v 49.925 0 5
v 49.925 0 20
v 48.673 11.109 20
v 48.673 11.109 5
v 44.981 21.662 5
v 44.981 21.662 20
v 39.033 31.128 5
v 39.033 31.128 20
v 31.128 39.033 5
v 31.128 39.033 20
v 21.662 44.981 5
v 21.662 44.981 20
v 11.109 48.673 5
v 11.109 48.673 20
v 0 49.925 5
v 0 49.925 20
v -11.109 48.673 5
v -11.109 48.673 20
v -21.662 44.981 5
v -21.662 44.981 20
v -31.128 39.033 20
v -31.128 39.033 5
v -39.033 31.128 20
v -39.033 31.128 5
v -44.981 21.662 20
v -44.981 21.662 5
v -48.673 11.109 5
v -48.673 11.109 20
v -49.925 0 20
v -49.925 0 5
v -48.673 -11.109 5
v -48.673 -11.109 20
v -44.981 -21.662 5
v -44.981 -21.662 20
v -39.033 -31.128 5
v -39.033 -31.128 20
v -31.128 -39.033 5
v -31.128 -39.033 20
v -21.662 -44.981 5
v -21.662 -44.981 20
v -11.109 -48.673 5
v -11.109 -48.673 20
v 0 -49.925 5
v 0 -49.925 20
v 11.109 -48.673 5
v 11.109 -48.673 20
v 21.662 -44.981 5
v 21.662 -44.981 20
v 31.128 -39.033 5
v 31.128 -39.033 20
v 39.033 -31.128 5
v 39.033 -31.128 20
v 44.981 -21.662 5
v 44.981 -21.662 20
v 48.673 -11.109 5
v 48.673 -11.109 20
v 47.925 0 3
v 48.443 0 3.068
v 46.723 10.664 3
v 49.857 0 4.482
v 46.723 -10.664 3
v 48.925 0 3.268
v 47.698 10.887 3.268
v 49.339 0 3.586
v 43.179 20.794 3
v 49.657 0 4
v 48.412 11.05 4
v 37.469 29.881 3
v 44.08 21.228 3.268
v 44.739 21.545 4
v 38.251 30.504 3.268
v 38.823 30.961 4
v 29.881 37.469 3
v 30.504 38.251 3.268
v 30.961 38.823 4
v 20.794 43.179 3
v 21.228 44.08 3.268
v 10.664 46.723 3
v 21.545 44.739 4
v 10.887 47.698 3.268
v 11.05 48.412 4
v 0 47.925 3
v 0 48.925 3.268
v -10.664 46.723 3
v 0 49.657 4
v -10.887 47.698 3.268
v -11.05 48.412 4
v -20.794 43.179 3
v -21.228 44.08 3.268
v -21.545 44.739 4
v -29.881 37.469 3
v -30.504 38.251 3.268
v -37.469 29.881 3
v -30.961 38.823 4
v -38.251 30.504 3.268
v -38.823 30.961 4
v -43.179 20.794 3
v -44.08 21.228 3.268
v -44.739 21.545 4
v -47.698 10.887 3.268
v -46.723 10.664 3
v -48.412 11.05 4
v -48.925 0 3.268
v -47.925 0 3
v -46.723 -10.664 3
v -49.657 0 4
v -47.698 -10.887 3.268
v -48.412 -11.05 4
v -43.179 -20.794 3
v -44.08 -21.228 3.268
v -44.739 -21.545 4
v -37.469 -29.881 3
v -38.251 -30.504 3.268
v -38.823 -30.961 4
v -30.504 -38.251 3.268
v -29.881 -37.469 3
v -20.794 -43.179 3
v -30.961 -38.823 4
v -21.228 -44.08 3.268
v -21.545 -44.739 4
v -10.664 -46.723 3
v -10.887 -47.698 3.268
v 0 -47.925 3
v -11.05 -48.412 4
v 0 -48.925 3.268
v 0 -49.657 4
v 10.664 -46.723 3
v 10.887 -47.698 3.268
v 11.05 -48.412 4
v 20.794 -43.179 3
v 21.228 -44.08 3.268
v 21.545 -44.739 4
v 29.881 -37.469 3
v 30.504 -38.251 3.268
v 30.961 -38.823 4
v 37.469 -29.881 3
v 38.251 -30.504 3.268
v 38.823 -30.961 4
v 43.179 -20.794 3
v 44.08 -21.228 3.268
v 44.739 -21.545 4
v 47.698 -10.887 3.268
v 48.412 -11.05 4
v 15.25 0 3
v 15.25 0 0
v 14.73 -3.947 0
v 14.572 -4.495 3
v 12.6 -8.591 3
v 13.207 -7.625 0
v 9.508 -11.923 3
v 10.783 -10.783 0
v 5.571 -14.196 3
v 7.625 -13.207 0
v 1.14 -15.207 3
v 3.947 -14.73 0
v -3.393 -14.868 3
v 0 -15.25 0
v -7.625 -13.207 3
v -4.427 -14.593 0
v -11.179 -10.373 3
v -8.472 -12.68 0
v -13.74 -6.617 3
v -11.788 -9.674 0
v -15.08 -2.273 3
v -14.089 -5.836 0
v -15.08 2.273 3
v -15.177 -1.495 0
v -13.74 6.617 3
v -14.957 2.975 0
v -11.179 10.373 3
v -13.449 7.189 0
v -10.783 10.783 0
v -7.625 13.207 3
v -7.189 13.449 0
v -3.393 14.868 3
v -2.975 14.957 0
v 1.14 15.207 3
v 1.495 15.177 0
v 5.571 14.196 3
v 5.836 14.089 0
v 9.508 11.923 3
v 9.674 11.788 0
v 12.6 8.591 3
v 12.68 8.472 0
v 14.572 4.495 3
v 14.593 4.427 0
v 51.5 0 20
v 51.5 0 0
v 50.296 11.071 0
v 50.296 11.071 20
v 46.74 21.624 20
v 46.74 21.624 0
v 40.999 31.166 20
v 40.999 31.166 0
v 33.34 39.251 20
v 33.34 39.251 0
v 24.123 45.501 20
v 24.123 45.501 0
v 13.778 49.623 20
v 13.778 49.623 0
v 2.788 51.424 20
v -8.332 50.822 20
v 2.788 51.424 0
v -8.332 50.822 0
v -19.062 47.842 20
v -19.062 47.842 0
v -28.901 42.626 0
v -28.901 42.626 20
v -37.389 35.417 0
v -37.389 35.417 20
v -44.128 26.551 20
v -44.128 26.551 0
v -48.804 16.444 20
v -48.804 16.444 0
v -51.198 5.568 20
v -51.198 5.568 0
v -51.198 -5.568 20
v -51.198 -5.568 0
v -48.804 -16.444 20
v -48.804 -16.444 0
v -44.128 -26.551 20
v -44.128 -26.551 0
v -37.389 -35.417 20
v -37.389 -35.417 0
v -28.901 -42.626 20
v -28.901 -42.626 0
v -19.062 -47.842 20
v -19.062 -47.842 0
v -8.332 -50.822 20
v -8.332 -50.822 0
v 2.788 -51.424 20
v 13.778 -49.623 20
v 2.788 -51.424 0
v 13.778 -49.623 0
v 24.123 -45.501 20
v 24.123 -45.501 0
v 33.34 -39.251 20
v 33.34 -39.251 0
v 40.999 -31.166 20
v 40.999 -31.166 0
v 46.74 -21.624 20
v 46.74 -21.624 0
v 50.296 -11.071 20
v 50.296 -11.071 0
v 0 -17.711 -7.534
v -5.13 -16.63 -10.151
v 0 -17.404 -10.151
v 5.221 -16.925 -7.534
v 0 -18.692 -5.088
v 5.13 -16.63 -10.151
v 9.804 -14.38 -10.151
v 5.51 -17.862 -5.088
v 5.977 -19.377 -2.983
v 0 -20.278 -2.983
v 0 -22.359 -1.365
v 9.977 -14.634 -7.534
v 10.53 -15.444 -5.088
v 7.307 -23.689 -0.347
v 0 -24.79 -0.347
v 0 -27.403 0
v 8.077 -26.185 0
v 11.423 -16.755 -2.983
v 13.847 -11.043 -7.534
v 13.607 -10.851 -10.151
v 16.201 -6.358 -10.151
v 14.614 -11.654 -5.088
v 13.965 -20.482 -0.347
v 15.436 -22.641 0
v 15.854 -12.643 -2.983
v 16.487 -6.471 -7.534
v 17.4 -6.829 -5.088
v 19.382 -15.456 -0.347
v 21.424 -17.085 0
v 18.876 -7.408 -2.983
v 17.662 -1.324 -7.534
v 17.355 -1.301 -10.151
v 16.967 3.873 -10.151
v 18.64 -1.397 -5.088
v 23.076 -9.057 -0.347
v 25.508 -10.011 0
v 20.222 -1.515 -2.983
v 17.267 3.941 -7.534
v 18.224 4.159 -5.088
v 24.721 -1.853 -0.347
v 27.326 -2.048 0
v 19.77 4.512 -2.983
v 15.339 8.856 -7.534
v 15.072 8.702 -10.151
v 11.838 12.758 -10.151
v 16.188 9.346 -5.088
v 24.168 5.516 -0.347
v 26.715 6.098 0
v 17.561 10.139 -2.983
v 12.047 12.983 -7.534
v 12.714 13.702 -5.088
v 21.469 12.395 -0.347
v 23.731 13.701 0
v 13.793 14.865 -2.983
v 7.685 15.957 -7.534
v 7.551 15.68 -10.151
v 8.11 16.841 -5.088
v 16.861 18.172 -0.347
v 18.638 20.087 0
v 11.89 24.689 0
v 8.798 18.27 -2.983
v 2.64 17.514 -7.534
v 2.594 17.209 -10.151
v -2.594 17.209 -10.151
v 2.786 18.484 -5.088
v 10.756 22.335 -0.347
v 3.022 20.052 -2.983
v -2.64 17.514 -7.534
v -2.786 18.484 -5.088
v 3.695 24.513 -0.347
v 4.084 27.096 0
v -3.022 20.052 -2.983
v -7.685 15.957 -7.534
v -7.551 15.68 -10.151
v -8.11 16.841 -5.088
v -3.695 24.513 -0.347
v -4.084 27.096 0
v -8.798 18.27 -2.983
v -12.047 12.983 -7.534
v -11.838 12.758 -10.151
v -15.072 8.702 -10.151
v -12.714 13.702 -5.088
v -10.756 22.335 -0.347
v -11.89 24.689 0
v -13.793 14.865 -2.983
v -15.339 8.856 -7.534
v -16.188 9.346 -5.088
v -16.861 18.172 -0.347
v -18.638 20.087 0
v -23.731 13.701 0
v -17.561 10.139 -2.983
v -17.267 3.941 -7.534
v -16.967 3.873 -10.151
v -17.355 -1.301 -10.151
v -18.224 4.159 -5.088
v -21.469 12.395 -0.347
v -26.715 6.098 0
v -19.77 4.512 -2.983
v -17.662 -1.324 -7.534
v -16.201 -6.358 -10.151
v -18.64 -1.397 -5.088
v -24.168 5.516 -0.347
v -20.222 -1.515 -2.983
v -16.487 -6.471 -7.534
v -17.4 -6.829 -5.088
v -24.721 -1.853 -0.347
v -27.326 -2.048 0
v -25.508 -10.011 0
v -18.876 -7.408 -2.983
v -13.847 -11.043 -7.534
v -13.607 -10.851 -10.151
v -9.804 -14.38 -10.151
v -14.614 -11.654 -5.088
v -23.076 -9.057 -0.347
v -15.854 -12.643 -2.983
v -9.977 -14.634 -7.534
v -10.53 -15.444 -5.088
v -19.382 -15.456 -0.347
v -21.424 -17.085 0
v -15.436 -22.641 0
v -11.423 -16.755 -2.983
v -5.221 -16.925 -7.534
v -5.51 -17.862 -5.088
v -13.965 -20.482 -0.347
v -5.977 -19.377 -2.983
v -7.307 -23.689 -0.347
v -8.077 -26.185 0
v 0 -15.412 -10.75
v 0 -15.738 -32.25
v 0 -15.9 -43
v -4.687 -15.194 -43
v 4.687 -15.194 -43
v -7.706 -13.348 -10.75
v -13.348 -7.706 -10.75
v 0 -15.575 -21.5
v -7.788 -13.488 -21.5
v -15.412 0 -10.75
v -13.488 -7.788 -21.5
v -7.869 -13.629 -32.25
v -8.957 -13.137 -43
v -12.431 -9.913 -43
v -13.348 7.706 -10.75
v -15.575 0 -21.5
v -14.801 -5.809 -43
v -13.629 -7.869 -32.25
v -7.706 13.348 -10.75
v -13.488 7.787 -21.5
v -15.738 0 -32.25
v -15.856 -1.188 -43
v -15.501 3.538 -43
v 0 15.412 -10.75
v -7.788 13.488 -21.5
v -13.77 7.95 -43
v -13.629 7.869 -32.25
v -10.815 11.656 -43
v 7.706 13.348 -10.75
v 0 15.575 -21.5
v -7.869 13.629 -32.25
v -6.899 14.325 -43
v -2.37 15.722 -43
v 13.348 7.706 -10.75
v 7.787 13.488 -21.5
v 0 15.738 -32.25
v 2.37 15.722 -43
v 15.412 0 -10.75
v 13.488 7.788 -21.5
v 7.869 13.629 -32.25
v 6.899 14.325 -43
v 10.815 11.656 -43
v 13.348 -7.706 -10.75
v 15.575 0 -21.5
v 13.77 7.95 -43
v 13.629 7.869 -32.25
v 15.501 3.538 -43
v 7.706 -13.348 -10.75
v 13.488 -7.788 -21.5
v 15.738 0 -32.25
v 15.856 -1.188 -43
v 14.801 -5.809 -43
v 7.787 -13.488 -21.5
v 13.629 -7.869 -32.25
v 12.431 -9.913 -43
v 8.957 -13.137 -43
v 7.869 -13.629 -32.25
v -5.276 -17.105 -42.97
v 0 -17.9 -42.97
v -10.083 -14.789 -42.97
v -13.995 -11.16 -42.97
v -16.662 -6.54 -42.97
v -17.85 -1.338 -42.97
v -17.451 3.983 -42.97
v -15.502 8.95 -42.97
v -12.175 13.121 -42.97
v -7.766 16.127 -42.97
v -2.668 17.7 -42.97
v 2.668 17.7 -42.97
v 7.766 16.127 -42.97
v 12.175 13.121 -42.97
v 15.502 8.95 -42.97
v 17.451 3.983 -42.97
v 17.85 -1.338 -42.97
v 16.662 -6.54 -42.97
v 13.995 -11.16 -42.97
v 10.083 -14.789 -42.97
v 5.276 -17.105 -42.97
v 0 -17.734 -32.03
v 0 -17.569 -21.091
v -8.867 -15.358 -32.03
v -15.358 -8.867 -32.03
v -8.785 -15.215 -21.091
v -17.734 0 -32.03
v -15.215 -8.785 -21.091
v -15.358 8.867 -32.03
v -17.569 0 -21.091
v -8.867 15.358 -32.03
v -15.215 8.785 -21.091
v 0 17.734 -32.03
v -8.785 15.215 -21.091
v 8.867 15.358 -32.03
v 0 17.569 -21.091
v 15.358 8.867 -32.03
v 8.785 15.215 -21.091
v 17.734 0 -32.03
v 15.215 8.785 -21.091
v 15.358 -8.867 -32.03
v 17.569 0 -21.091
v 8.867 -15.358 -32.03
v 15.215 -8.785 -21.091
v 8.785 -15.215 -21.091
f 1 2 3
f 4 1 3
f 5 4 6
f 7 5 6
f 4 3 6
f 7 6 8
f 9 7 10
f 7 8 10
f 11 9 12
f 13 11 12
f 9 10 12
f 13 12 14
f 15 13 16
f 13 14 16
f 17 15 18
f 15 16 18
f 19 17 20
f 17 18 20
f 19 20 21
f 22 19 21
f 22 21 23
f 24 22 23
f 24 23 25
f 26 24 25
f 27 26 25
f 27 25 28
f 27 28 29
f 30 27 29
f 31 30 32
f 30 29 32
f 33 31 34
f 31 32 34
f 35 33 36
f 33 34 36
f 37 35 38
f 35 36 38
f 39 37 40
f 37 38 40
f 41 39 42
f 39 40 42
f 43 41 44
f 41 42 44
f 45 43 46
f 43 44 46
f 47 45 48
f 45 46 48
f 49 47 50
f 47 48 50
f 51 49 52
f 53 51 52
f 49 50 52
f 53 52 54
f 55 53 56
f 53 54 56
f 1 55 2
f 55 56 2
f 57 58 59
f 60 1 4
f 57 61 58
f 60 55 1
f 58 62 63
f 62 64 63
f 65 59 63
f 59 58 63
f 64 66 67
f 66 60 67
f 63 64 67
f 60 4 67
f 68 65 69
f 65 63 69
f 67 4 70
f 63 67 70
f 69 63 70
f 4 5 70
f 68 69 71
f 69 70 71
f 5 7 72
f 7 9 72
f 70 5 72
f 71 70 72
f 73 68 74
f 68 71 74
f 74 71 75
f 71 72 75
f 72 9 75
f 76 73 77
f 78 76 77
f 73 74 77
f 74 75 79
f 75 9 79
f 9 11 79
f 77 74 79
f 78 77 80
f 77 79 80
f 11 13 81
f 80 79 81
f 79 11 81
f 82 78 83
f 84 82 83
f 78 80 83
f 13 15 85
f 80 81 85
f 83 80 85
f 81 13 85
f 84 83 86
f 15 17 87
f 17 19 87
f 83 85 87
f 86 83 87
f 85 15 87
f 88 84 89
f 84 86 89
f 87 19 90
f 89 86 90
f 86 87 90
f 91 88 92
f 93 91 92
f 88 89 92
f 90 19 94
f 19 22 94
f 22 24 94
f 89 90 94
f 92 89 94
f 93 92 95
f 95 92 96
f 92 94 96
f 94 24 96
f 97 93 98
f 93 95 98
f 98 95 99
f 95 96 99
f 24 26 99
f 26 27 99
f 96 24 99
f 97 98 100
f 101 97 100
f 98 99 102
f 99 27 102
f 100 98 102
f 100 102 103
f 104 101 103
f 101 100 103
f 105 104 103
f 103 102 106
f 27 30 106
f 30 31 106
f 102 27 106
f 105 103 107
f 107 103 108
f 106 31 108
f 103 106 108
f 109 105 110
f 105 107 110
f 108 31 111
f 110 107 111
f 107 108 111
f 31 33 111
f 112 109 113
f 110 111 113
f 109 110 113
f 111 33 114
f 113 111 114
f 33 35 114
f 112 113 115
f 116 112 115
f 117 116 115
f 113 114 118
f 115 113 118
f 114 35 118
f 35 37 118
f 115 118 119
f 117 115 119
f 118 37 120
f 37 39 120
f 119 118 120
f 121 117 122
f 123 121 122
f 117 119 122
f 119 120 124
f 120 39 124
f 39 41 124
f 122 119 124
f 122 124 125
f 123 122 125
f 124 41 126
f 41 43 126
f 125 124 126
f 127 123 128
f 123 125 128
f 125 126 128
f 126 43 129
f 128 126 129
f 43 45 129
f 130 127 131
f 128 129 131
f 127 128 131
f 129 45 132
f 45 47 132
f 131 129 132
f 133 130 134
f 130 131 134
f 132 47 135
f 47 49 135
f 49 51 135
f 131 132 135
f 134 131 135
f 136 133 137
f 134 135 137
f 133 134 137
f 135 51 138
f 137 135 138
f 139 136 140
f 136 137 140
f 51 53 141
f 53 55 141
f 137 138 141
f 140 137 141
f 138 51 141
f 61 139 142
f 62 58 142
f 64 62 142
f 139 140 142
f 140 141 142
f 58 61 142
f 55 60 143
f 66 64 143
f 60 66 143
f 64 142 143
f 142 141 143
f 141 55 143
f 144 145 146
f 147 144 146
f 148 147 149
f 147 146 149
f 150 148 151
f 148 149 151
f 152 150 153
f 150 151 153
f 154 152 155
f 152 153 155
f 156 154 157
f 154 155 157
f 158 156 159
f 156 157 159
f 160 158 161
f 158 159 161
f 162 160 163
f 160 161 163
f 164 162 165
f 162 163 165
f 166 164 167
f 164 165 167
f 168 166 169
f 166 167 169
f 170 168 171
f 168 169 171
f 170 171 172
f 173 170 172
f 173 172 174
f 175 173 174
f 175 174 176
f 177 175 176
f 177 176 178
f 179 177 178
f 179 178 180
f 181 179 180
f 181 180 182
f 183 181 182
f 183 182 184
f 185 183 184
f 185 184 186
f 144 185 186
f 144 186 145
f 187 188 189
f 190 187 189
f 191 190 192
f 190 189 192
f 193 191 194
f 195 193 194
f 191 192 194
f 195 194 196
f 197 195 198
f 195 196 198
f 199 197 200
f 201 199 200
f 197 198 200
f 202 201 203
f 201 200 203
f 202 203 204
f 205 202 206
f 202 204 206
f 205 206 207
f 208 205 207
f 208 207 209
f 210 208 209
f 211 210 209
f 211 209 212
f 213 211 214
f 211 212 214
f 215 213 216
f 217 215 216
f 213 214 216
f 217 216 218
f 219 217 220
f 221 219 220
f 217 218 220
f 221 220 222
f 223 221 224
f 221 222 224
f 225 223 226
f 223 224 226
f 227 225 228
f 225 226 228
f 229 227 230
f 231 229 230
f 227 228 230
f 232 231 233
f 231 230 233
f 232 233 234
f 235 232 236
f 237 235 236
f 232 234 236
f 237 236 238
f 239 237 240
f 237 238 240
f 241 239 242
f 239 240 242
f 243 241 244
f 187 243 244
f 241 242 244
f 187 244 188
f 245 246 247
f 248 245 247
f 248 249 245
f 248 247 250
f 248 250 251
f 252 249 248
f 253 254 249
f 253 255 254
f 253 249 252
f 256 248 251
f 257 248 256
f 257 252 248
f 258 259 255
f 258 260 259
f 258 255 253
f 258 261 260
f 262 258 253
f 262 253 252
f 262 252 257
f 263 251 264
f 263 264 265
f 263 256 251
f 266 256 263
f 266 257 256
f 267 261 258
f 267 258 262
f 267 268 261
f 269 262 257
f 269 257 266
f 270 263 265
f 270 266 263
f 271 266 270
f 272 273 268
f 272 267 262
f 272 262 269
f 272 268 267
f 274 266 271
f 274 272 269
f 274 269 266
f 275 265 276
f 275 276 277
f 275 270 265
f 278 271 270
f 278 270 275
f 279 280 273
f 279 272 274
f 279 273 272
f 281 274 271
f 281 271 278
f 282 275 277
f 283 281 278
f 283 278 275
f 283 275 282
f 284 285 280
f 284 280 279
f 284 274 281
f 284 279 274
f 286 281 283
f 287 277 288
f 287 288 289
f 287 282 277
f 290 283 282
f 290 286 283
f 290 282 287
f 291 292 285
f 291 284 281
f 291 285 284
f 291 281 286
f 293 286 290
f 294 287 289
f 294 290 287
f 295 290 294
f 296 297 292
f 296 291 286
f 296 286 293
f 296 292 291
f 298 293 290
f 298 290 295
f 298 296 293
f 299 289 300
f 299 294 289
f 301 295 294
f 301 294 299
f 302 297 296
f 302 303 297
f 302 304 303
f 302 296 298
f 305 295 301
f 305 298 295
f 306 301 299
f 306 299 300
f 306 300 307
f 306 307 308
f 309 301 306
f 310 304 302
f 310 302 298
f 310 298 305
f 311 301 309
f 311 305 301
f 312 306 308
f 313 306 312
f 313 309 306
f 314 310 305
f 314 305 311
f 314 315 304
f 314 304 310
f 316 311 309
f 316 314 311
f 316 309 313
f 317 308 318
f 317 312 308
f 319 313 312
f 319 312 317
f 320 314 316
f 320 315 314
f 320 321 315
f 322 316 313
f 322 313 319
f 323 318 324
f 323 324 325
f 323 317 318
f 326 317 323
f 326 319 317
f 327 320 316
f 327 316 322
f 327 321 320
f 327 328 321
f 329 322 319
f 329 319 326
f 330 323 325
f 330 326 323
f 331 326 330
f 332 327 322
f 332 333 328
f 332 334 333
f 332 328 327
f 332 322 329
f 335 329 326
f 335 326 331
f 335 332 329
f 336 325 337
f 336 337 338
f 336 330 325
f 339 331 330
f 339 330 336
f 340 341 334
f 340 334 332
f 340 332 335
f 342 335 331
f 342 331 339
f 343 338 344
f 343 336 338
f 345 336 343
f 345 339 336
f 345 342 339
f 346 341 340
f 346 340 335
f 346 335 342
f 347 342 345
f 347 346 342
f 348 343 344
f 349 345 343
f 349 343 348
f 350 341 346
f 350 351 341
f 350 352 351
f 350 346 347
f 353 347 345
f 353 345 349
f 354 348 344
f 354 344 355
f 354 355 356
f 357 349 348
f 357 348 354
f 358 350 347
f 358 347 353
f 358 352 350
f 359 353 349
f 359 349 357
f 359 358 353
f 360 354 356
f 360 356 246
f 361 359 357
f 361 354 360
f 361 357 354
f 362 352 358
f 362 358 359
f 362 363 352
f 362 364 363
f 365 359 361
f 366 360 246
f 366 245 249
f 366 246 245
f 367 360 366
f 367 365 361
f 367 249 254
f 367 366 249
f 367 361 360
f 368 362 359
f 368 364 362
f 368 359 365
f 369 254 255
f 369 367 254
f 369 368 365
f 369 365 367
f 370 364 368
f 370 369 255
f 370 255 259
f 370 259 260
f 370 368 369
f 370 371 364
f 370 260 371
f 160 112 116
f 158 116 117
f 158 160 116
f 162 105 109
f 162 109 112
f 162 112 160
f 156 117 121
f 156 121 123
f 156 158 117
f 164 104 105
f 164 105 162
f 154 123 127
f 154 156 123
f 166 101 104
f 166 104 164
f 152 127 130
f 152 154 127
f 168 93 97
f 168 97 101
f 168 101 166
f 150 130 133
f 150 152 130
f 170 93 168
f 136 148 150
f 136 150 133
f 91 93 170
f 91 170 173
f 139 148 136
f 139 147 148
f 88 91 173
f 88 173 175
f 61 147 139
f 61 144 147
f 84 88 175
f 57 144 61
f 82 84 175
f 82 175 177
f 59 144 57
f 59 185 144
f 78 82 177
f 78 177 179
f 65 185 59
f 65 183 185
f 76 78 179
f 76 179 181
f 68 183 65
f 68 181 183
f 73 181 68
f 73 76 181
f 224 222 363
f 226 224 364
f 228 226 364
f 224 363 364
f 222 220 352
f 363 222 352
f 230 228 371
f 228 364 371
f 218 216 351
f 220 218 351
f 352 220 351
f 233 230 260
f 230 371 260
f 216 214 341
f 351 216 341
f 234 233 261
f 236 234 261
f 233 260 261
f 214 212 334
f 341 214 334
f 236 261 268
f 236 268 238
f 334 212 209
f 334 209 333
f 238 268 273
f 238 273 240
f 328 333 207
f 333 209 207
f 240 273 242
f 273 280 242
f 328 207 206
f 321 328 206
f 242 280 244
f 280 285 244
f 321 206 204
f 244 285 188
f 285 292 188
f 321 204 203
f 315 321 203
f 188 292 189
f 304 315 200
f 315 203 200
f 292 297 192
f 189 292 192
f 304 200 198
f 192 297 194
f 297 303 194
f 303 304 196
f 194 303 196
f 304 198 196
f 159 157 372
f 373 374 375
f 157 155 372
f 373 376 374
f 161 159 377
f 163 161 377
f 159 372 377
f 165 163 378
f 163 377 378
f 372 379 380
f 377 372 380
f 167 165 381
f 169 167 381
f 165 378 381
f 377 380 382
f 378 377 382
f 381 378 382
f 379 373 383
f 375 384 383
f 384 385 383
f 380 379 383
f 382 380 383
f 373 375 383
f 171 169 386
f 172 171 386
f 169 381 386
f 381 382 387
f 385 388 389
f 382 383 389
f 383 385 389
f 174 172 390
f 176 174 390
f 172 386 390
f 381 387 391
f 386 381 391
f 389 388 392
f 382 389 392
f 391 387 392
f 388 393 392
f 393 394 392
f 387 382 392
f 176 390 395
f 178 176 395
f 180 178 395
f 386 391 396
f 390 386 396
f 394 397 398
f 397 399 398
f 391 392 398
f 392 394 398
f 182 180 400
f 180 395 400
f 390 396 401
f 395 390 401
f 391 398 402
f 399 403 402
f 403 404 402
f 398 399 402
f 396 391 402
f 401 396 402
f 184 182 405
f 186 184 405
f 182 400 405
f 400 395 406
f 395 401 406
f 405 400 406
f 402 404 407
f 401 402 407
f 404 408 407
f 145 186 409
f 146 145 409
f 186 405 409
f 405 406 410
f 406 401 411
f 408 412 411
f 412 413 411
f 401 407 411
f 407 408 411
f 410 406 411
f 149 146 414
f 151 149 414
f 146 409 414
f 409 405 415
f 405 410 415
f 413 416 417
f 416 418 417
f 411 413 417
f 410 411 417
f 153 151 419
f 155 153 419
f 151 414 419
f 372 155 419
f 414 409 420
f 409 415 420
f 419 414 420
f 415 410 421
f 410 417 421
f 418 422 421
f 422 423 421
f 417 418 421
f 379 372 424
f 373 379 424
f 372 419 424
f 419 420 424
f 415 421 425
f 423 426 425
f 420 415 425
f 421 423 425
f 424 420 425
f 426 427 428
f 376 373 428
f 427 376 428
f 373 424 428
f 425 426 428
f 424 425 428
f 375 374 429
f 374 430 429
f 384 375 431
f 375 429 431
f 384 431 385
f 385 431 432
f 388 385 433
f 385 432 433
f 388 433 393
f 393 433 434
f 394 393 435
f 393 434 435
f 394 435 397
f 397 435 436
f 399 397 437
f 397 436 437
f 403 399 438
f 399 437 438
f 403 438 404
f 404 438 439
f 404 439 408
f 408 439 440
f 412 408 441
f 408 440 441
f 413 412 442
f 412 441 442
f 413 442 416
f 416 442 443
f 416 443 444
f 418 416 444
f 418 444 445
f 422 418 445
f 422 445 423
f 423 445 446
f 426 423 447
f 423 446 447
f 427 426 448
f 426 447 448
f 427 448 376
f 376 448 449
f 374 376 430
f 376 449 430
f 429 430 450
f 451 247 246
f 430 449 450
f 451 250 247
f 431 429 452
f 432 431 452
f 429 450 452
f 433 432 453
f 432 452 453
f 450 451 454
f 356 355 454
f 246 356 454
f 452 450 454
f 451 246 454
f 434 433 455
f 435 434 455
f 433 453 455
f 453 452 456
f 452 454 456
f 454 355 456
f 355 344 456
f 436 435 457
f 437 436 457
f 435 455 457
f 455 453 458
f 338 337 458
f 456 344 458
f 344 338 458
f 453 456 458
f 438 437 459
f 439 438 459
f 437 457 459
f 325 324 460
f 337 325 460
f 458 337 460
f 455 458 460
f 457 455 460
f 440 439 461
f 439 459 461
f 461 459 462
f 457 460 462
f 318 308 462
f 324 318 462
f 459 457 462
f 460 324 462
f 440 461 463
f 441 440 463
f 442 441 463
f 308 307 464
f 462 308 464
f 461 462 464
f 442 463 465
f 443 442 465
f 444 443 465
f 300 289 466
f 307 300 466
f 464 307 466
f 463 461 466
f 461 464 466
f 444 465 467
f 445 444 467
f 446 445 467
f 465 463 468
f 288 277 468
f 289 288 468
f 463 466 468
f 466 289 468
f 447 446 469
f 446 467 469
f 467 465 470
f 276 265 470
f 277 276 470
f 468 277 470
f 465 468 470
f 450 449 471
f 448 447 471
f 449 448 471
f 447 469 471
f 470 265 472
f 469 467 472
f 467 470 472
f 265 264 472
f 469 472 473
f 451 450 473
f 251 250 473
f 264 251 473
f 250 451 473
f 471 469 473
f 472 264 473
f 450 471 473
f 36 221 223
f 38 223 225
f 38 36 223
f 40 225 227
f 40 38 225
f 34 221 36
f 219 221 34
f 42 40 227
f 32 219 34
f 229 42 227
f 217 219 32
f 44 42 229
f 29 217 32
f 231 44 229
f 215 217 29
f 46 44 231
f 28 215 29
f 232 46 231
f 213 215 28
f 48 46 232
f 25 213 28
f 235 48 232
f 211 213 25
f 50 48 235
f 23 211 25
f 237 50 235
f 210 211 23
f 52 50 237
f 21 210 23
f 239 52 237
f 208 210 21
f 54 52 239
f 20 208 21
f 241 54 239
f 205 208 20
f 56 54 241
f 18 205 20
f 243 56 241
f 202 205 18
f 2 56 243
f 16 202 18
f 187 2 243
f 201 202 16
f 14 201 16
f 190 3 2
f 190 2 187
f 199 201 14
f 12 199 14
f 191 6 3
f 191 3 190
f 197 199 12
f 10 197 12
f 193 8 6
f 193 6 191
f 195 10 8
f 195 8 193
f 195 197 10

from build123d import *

# Parameters (mm, degrees)
F0_R     = 51.5
F1_DEPTH = 20
F2_R     = 49.925
F3_DEPTH = 17
F4_R     = 15.25
F5_DEPTH = 25
F8_R     = 10
F9_R     = 2


with BuildPart() as f1:
    # F0 (on Top) → F1 (new body)
    with BuildSketch(Plane.XY):
        Circle(F0_R)
    extrude(amount=F1_DEPTH)

    # F2 (on face) → F3 (cut)
    with BuildSketch(Plane.XY.offset(20)):
        Circle(F2_R)
    extrude(amount=-F3_DEPTH, mode=Mode.SUBTRACT)

    # F4 (on face) → F5 (cut)
    with BuildSketch(Plane(origin=(0, 0, 0), x_dir=(1, 0, 0), z_dir=(0, 0, -1))):
        Circle(F4_R)
    extrude(amount=-F5_DEPTH, mode=Mode.SUBTRACT)

    # F7: sweep along a path in F7_path
    with BuildLine(Plane(origin=(51.5, 0, 0), x_dir=(0, -1, 0), z_dir=(0, 0, -1))) as f7_path:
        CenterArc((0, 51.5), 51.5, 0, 360)
    # F6 (on Right) → F7 (sweep)
    with BuildSketch(Plane.YZ):
        Polygon((17.2497715373, 0.0302291046), (15.25, 0), (15.9, -43), (17.8997715373, -42.9697708954), align=None)
    sweep(path=f7_path.line)

    # F8
    f8_edges = [f1.edges().sort_by_distance(p)[0] for p in [
        (0, 17.250228, 0),
    ]]
    fillet(f8_edges, radius=F8_R)

    # F9
    f9_edges = [f1.edges().sort_by_distance(p)[0] for p in [
        (-49.925, 0, 3),
    ]]
    fillet(f9_edges, radius=F9_R)


solid = f1.part
